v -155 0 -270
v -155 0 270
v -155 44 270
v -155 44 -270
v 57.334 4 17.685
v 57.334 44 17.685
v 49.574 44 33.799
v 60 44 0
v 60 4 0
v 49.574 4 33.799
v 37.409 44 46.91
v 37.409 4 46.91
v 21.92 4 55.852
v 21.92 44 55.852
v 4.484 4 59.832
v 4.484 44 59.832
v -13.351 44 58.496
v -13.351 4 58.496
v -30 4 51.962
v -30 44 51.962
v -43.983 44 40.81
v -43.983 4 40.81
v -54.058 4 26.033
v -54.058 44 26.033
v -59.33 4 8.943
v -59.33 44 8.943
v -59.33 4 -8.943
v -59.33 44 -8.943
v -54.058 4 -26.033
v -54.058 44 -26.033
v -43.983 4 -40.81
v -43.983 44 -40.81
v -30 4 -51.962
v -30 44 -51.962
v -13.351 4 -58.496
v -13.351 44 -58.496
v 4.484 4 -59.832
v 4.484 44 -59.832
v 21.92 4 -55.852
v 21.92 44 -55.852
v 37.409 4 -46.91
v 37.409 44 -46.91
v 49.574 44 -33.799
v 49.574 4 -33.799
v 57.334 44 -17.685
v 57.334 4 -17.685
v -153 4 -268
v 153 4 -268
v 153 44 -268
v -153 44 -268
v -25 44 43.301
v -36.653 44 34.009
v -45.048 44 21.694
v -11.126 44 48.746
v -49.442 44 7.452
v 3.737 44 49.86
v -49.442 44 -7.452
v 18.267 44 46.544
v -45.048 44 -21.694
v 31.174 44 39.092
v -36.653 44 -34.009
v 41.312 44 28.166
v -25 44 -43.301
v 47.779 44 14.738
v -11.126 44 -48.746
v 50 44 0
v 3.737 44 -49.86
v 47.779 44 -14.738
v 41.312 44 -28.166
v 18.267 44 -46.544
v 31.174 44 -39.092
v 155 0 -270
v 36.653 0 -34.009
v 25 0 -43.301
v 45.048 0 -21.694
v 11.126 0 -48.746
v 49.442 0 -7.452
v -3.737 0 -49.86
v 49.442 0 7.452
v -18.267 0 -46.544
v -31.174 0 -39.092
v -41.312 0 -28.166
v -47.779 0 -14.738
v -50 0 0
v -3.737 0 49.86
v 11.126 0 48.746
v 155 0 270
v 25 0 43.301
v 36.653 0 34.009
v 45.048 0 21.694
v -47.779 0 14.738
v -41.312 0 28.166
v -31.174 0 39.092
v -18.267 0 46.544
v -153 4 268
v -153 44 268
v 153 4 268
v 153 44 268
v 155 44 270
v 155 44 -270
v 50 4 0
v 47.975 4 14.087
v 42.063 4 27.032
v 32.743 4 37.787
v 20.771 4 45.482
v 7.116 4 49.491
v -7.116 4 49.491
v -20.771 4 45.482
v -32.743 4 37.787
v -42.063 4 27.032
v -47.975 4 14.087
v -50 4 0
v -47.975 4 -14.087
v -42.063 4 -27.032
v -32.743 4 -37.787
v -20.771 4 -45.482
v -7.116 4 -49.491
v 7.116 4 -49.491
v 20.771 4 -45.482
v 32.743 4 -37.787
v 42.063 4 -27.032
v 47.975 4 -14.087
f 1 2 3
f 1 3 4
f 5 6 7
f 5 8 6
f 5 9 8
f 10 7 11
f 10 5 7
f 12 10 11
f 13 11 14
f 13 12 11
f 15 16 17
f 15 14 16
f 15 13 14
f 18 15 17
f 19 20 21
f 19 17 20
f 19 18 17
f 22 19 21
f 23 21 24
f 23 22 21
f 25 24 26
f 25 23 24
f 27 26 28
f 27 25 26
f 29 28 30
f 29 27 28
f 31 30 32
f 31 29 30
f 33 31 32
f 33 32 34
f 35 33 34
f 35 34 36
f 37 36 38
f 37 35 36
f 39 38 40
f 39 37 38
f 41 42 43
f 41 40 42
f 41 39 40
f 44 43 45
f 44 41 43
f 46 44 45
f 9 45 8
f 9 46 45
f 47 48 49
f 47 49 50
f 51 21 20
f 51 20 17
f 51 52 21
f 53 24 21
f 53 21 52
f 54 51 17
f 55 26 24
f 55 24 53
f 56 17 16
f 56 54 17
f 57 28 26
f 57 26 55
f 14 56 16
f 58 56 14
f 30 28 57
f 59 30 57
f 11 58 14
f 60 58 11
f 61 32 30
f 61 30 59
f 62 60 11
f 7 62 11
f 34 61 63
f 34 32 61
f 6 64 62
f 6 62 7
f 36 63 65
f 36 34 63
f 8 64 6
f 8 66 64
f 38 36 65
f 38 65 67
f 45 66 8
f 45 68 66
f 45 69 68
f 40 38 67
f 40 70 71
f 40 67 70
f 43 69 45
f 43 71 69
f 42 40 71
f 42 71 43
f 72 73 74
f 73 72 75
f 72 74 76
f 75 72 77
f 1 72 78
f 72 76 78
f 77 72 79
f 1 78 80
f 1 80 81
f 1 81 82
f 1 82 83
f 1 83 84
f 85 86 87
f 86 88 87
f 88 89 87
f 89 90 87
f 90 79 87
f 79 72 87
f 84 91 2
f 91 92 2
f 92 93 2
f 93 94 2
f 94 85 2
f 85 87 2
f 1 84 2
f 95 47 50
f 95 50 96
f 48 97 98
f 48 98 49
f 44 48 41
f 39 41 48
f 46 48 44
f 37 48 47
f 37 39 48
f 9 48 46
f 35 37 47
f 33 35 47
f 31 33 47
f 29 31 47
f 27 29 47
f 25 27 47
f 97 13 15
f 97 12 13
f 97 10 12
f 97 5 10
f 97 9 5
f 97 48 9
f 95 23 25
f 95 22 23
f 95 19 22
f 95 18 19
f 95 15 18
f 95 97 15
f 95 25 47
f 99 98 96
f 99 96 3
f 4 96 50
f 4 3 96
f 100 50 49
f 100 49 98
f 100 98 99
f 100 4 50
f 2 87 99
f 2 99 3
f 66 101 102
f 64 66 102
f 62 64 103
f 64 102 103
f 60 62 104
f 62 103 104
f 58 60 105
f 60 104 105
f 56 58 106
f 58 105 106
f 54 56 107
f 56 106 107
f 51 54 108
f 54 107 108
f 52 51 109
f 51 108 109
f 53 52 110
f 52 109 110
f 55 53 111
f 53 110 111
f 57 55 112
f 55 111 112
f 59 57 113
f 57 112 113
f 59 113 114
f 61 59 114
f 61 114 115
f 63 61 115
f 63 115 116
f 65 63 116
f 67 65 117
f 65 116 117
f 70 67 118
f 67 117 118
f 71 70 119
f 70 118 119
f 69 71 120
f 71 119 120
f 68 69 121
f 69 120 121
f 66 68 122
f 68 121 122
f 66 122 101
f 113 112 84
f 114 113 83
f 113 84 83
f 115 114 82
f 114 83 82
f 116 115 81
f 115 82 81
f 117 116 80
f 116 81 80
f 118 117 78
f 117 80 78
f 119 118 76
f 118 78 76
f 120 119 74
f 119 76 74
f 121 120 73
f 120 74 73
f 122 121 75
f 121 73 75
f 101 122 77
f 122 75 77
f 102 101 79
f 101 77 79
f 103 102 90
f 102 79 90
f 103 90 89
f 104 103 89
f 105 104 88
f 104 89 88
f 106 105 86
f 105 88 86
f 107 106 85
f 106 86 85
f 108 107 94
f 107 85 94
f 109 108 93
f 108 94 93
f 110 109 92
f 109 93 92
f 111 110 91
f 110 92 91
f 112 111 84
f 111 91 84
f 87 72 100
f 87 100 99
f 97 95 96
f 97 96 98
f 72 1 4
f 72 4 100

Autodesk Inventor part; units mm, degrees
ref_plane "YZ Plane" through (0, 0, 0) normal (1, 0, 0) x (0, 1, 0)
ref_plane "XZ Plane" through (0, 0, 0) normal (0, 1, 0) x (-1, 0, 0)
ref_plane "XY Plane" through (0, 0, 0) normal (0, 0, 1) x (1, 0, 0)
sketch "Эскиз1" plane through (0, 0, 0) normal (0, 1, 0) x (-1, 0, 0)
  line L0 (-155, 270) -> (155, 270)
  line L1 (155, 270) -> (155, -270)
  line L2 (155, -270) -> (-155, -270)
  line L3 (-155, -270) -> (-155, 270)
  line L4 (-155, 270) -> (155, -270) construction
  line L5 (155, 270) -> (-155, -270) construction
  circle A0 centre (0, 0) radius 50
  dimension "d0" = 310
  dimension "d1" = 540
  dimension "d2" = 100
extrude "Выдавливание1" add sketch "Эскиз1" along normal blind 4
sketch "Эскиз2" plane through (0, 4, 0) normal (0, 1, 0) x (1, 0, 0)
  line L0 (153, 268) -> (-153, 268)
  line L1 (-153, 268) -> (-153, -268)
  line L2 (-153, -268) -> (153, -268)
  line L3 (153, -268) -> (153, 268)
  line L4 (153, 268) -> (-153, -268) construction
  line L5 (-153, 268) -> (153, -268) construction
  line L6 (-155, 270) -> (-155, -270) projected
  line L7 (155, 270) -> (-155, 270)
  line L8 (-155, 270) -> (-155, -270)
  line L9 (-155, -270) -> (155, -270)
  line L10 (155, -270) -> (155, 270)
  line L11 (155, 270) -> (-155, -270) construction
  line L12 (-155, 270) -> (155, -270) construction
  point P0 (0, 0)
  dimension "d5" = 306
  dimension "d6" = 536
extrude "Выдавливание2" add sketch "Эскиз2" along normal blind 40
sketch "Эскиз3" plane through (0, 4, 0) normal (0, 1, 0) x (1, 0, 0)
  circle A0 centre (0, 0) radius 50
  circle A1 centre (0, 0) radius 60
  dimension "d9" = 120
extrude "Выдавливание3" add sketch "Эскиз3" along normal blind 40
properties part number "ЗЕМЛЯЕМКОСТЬ"
